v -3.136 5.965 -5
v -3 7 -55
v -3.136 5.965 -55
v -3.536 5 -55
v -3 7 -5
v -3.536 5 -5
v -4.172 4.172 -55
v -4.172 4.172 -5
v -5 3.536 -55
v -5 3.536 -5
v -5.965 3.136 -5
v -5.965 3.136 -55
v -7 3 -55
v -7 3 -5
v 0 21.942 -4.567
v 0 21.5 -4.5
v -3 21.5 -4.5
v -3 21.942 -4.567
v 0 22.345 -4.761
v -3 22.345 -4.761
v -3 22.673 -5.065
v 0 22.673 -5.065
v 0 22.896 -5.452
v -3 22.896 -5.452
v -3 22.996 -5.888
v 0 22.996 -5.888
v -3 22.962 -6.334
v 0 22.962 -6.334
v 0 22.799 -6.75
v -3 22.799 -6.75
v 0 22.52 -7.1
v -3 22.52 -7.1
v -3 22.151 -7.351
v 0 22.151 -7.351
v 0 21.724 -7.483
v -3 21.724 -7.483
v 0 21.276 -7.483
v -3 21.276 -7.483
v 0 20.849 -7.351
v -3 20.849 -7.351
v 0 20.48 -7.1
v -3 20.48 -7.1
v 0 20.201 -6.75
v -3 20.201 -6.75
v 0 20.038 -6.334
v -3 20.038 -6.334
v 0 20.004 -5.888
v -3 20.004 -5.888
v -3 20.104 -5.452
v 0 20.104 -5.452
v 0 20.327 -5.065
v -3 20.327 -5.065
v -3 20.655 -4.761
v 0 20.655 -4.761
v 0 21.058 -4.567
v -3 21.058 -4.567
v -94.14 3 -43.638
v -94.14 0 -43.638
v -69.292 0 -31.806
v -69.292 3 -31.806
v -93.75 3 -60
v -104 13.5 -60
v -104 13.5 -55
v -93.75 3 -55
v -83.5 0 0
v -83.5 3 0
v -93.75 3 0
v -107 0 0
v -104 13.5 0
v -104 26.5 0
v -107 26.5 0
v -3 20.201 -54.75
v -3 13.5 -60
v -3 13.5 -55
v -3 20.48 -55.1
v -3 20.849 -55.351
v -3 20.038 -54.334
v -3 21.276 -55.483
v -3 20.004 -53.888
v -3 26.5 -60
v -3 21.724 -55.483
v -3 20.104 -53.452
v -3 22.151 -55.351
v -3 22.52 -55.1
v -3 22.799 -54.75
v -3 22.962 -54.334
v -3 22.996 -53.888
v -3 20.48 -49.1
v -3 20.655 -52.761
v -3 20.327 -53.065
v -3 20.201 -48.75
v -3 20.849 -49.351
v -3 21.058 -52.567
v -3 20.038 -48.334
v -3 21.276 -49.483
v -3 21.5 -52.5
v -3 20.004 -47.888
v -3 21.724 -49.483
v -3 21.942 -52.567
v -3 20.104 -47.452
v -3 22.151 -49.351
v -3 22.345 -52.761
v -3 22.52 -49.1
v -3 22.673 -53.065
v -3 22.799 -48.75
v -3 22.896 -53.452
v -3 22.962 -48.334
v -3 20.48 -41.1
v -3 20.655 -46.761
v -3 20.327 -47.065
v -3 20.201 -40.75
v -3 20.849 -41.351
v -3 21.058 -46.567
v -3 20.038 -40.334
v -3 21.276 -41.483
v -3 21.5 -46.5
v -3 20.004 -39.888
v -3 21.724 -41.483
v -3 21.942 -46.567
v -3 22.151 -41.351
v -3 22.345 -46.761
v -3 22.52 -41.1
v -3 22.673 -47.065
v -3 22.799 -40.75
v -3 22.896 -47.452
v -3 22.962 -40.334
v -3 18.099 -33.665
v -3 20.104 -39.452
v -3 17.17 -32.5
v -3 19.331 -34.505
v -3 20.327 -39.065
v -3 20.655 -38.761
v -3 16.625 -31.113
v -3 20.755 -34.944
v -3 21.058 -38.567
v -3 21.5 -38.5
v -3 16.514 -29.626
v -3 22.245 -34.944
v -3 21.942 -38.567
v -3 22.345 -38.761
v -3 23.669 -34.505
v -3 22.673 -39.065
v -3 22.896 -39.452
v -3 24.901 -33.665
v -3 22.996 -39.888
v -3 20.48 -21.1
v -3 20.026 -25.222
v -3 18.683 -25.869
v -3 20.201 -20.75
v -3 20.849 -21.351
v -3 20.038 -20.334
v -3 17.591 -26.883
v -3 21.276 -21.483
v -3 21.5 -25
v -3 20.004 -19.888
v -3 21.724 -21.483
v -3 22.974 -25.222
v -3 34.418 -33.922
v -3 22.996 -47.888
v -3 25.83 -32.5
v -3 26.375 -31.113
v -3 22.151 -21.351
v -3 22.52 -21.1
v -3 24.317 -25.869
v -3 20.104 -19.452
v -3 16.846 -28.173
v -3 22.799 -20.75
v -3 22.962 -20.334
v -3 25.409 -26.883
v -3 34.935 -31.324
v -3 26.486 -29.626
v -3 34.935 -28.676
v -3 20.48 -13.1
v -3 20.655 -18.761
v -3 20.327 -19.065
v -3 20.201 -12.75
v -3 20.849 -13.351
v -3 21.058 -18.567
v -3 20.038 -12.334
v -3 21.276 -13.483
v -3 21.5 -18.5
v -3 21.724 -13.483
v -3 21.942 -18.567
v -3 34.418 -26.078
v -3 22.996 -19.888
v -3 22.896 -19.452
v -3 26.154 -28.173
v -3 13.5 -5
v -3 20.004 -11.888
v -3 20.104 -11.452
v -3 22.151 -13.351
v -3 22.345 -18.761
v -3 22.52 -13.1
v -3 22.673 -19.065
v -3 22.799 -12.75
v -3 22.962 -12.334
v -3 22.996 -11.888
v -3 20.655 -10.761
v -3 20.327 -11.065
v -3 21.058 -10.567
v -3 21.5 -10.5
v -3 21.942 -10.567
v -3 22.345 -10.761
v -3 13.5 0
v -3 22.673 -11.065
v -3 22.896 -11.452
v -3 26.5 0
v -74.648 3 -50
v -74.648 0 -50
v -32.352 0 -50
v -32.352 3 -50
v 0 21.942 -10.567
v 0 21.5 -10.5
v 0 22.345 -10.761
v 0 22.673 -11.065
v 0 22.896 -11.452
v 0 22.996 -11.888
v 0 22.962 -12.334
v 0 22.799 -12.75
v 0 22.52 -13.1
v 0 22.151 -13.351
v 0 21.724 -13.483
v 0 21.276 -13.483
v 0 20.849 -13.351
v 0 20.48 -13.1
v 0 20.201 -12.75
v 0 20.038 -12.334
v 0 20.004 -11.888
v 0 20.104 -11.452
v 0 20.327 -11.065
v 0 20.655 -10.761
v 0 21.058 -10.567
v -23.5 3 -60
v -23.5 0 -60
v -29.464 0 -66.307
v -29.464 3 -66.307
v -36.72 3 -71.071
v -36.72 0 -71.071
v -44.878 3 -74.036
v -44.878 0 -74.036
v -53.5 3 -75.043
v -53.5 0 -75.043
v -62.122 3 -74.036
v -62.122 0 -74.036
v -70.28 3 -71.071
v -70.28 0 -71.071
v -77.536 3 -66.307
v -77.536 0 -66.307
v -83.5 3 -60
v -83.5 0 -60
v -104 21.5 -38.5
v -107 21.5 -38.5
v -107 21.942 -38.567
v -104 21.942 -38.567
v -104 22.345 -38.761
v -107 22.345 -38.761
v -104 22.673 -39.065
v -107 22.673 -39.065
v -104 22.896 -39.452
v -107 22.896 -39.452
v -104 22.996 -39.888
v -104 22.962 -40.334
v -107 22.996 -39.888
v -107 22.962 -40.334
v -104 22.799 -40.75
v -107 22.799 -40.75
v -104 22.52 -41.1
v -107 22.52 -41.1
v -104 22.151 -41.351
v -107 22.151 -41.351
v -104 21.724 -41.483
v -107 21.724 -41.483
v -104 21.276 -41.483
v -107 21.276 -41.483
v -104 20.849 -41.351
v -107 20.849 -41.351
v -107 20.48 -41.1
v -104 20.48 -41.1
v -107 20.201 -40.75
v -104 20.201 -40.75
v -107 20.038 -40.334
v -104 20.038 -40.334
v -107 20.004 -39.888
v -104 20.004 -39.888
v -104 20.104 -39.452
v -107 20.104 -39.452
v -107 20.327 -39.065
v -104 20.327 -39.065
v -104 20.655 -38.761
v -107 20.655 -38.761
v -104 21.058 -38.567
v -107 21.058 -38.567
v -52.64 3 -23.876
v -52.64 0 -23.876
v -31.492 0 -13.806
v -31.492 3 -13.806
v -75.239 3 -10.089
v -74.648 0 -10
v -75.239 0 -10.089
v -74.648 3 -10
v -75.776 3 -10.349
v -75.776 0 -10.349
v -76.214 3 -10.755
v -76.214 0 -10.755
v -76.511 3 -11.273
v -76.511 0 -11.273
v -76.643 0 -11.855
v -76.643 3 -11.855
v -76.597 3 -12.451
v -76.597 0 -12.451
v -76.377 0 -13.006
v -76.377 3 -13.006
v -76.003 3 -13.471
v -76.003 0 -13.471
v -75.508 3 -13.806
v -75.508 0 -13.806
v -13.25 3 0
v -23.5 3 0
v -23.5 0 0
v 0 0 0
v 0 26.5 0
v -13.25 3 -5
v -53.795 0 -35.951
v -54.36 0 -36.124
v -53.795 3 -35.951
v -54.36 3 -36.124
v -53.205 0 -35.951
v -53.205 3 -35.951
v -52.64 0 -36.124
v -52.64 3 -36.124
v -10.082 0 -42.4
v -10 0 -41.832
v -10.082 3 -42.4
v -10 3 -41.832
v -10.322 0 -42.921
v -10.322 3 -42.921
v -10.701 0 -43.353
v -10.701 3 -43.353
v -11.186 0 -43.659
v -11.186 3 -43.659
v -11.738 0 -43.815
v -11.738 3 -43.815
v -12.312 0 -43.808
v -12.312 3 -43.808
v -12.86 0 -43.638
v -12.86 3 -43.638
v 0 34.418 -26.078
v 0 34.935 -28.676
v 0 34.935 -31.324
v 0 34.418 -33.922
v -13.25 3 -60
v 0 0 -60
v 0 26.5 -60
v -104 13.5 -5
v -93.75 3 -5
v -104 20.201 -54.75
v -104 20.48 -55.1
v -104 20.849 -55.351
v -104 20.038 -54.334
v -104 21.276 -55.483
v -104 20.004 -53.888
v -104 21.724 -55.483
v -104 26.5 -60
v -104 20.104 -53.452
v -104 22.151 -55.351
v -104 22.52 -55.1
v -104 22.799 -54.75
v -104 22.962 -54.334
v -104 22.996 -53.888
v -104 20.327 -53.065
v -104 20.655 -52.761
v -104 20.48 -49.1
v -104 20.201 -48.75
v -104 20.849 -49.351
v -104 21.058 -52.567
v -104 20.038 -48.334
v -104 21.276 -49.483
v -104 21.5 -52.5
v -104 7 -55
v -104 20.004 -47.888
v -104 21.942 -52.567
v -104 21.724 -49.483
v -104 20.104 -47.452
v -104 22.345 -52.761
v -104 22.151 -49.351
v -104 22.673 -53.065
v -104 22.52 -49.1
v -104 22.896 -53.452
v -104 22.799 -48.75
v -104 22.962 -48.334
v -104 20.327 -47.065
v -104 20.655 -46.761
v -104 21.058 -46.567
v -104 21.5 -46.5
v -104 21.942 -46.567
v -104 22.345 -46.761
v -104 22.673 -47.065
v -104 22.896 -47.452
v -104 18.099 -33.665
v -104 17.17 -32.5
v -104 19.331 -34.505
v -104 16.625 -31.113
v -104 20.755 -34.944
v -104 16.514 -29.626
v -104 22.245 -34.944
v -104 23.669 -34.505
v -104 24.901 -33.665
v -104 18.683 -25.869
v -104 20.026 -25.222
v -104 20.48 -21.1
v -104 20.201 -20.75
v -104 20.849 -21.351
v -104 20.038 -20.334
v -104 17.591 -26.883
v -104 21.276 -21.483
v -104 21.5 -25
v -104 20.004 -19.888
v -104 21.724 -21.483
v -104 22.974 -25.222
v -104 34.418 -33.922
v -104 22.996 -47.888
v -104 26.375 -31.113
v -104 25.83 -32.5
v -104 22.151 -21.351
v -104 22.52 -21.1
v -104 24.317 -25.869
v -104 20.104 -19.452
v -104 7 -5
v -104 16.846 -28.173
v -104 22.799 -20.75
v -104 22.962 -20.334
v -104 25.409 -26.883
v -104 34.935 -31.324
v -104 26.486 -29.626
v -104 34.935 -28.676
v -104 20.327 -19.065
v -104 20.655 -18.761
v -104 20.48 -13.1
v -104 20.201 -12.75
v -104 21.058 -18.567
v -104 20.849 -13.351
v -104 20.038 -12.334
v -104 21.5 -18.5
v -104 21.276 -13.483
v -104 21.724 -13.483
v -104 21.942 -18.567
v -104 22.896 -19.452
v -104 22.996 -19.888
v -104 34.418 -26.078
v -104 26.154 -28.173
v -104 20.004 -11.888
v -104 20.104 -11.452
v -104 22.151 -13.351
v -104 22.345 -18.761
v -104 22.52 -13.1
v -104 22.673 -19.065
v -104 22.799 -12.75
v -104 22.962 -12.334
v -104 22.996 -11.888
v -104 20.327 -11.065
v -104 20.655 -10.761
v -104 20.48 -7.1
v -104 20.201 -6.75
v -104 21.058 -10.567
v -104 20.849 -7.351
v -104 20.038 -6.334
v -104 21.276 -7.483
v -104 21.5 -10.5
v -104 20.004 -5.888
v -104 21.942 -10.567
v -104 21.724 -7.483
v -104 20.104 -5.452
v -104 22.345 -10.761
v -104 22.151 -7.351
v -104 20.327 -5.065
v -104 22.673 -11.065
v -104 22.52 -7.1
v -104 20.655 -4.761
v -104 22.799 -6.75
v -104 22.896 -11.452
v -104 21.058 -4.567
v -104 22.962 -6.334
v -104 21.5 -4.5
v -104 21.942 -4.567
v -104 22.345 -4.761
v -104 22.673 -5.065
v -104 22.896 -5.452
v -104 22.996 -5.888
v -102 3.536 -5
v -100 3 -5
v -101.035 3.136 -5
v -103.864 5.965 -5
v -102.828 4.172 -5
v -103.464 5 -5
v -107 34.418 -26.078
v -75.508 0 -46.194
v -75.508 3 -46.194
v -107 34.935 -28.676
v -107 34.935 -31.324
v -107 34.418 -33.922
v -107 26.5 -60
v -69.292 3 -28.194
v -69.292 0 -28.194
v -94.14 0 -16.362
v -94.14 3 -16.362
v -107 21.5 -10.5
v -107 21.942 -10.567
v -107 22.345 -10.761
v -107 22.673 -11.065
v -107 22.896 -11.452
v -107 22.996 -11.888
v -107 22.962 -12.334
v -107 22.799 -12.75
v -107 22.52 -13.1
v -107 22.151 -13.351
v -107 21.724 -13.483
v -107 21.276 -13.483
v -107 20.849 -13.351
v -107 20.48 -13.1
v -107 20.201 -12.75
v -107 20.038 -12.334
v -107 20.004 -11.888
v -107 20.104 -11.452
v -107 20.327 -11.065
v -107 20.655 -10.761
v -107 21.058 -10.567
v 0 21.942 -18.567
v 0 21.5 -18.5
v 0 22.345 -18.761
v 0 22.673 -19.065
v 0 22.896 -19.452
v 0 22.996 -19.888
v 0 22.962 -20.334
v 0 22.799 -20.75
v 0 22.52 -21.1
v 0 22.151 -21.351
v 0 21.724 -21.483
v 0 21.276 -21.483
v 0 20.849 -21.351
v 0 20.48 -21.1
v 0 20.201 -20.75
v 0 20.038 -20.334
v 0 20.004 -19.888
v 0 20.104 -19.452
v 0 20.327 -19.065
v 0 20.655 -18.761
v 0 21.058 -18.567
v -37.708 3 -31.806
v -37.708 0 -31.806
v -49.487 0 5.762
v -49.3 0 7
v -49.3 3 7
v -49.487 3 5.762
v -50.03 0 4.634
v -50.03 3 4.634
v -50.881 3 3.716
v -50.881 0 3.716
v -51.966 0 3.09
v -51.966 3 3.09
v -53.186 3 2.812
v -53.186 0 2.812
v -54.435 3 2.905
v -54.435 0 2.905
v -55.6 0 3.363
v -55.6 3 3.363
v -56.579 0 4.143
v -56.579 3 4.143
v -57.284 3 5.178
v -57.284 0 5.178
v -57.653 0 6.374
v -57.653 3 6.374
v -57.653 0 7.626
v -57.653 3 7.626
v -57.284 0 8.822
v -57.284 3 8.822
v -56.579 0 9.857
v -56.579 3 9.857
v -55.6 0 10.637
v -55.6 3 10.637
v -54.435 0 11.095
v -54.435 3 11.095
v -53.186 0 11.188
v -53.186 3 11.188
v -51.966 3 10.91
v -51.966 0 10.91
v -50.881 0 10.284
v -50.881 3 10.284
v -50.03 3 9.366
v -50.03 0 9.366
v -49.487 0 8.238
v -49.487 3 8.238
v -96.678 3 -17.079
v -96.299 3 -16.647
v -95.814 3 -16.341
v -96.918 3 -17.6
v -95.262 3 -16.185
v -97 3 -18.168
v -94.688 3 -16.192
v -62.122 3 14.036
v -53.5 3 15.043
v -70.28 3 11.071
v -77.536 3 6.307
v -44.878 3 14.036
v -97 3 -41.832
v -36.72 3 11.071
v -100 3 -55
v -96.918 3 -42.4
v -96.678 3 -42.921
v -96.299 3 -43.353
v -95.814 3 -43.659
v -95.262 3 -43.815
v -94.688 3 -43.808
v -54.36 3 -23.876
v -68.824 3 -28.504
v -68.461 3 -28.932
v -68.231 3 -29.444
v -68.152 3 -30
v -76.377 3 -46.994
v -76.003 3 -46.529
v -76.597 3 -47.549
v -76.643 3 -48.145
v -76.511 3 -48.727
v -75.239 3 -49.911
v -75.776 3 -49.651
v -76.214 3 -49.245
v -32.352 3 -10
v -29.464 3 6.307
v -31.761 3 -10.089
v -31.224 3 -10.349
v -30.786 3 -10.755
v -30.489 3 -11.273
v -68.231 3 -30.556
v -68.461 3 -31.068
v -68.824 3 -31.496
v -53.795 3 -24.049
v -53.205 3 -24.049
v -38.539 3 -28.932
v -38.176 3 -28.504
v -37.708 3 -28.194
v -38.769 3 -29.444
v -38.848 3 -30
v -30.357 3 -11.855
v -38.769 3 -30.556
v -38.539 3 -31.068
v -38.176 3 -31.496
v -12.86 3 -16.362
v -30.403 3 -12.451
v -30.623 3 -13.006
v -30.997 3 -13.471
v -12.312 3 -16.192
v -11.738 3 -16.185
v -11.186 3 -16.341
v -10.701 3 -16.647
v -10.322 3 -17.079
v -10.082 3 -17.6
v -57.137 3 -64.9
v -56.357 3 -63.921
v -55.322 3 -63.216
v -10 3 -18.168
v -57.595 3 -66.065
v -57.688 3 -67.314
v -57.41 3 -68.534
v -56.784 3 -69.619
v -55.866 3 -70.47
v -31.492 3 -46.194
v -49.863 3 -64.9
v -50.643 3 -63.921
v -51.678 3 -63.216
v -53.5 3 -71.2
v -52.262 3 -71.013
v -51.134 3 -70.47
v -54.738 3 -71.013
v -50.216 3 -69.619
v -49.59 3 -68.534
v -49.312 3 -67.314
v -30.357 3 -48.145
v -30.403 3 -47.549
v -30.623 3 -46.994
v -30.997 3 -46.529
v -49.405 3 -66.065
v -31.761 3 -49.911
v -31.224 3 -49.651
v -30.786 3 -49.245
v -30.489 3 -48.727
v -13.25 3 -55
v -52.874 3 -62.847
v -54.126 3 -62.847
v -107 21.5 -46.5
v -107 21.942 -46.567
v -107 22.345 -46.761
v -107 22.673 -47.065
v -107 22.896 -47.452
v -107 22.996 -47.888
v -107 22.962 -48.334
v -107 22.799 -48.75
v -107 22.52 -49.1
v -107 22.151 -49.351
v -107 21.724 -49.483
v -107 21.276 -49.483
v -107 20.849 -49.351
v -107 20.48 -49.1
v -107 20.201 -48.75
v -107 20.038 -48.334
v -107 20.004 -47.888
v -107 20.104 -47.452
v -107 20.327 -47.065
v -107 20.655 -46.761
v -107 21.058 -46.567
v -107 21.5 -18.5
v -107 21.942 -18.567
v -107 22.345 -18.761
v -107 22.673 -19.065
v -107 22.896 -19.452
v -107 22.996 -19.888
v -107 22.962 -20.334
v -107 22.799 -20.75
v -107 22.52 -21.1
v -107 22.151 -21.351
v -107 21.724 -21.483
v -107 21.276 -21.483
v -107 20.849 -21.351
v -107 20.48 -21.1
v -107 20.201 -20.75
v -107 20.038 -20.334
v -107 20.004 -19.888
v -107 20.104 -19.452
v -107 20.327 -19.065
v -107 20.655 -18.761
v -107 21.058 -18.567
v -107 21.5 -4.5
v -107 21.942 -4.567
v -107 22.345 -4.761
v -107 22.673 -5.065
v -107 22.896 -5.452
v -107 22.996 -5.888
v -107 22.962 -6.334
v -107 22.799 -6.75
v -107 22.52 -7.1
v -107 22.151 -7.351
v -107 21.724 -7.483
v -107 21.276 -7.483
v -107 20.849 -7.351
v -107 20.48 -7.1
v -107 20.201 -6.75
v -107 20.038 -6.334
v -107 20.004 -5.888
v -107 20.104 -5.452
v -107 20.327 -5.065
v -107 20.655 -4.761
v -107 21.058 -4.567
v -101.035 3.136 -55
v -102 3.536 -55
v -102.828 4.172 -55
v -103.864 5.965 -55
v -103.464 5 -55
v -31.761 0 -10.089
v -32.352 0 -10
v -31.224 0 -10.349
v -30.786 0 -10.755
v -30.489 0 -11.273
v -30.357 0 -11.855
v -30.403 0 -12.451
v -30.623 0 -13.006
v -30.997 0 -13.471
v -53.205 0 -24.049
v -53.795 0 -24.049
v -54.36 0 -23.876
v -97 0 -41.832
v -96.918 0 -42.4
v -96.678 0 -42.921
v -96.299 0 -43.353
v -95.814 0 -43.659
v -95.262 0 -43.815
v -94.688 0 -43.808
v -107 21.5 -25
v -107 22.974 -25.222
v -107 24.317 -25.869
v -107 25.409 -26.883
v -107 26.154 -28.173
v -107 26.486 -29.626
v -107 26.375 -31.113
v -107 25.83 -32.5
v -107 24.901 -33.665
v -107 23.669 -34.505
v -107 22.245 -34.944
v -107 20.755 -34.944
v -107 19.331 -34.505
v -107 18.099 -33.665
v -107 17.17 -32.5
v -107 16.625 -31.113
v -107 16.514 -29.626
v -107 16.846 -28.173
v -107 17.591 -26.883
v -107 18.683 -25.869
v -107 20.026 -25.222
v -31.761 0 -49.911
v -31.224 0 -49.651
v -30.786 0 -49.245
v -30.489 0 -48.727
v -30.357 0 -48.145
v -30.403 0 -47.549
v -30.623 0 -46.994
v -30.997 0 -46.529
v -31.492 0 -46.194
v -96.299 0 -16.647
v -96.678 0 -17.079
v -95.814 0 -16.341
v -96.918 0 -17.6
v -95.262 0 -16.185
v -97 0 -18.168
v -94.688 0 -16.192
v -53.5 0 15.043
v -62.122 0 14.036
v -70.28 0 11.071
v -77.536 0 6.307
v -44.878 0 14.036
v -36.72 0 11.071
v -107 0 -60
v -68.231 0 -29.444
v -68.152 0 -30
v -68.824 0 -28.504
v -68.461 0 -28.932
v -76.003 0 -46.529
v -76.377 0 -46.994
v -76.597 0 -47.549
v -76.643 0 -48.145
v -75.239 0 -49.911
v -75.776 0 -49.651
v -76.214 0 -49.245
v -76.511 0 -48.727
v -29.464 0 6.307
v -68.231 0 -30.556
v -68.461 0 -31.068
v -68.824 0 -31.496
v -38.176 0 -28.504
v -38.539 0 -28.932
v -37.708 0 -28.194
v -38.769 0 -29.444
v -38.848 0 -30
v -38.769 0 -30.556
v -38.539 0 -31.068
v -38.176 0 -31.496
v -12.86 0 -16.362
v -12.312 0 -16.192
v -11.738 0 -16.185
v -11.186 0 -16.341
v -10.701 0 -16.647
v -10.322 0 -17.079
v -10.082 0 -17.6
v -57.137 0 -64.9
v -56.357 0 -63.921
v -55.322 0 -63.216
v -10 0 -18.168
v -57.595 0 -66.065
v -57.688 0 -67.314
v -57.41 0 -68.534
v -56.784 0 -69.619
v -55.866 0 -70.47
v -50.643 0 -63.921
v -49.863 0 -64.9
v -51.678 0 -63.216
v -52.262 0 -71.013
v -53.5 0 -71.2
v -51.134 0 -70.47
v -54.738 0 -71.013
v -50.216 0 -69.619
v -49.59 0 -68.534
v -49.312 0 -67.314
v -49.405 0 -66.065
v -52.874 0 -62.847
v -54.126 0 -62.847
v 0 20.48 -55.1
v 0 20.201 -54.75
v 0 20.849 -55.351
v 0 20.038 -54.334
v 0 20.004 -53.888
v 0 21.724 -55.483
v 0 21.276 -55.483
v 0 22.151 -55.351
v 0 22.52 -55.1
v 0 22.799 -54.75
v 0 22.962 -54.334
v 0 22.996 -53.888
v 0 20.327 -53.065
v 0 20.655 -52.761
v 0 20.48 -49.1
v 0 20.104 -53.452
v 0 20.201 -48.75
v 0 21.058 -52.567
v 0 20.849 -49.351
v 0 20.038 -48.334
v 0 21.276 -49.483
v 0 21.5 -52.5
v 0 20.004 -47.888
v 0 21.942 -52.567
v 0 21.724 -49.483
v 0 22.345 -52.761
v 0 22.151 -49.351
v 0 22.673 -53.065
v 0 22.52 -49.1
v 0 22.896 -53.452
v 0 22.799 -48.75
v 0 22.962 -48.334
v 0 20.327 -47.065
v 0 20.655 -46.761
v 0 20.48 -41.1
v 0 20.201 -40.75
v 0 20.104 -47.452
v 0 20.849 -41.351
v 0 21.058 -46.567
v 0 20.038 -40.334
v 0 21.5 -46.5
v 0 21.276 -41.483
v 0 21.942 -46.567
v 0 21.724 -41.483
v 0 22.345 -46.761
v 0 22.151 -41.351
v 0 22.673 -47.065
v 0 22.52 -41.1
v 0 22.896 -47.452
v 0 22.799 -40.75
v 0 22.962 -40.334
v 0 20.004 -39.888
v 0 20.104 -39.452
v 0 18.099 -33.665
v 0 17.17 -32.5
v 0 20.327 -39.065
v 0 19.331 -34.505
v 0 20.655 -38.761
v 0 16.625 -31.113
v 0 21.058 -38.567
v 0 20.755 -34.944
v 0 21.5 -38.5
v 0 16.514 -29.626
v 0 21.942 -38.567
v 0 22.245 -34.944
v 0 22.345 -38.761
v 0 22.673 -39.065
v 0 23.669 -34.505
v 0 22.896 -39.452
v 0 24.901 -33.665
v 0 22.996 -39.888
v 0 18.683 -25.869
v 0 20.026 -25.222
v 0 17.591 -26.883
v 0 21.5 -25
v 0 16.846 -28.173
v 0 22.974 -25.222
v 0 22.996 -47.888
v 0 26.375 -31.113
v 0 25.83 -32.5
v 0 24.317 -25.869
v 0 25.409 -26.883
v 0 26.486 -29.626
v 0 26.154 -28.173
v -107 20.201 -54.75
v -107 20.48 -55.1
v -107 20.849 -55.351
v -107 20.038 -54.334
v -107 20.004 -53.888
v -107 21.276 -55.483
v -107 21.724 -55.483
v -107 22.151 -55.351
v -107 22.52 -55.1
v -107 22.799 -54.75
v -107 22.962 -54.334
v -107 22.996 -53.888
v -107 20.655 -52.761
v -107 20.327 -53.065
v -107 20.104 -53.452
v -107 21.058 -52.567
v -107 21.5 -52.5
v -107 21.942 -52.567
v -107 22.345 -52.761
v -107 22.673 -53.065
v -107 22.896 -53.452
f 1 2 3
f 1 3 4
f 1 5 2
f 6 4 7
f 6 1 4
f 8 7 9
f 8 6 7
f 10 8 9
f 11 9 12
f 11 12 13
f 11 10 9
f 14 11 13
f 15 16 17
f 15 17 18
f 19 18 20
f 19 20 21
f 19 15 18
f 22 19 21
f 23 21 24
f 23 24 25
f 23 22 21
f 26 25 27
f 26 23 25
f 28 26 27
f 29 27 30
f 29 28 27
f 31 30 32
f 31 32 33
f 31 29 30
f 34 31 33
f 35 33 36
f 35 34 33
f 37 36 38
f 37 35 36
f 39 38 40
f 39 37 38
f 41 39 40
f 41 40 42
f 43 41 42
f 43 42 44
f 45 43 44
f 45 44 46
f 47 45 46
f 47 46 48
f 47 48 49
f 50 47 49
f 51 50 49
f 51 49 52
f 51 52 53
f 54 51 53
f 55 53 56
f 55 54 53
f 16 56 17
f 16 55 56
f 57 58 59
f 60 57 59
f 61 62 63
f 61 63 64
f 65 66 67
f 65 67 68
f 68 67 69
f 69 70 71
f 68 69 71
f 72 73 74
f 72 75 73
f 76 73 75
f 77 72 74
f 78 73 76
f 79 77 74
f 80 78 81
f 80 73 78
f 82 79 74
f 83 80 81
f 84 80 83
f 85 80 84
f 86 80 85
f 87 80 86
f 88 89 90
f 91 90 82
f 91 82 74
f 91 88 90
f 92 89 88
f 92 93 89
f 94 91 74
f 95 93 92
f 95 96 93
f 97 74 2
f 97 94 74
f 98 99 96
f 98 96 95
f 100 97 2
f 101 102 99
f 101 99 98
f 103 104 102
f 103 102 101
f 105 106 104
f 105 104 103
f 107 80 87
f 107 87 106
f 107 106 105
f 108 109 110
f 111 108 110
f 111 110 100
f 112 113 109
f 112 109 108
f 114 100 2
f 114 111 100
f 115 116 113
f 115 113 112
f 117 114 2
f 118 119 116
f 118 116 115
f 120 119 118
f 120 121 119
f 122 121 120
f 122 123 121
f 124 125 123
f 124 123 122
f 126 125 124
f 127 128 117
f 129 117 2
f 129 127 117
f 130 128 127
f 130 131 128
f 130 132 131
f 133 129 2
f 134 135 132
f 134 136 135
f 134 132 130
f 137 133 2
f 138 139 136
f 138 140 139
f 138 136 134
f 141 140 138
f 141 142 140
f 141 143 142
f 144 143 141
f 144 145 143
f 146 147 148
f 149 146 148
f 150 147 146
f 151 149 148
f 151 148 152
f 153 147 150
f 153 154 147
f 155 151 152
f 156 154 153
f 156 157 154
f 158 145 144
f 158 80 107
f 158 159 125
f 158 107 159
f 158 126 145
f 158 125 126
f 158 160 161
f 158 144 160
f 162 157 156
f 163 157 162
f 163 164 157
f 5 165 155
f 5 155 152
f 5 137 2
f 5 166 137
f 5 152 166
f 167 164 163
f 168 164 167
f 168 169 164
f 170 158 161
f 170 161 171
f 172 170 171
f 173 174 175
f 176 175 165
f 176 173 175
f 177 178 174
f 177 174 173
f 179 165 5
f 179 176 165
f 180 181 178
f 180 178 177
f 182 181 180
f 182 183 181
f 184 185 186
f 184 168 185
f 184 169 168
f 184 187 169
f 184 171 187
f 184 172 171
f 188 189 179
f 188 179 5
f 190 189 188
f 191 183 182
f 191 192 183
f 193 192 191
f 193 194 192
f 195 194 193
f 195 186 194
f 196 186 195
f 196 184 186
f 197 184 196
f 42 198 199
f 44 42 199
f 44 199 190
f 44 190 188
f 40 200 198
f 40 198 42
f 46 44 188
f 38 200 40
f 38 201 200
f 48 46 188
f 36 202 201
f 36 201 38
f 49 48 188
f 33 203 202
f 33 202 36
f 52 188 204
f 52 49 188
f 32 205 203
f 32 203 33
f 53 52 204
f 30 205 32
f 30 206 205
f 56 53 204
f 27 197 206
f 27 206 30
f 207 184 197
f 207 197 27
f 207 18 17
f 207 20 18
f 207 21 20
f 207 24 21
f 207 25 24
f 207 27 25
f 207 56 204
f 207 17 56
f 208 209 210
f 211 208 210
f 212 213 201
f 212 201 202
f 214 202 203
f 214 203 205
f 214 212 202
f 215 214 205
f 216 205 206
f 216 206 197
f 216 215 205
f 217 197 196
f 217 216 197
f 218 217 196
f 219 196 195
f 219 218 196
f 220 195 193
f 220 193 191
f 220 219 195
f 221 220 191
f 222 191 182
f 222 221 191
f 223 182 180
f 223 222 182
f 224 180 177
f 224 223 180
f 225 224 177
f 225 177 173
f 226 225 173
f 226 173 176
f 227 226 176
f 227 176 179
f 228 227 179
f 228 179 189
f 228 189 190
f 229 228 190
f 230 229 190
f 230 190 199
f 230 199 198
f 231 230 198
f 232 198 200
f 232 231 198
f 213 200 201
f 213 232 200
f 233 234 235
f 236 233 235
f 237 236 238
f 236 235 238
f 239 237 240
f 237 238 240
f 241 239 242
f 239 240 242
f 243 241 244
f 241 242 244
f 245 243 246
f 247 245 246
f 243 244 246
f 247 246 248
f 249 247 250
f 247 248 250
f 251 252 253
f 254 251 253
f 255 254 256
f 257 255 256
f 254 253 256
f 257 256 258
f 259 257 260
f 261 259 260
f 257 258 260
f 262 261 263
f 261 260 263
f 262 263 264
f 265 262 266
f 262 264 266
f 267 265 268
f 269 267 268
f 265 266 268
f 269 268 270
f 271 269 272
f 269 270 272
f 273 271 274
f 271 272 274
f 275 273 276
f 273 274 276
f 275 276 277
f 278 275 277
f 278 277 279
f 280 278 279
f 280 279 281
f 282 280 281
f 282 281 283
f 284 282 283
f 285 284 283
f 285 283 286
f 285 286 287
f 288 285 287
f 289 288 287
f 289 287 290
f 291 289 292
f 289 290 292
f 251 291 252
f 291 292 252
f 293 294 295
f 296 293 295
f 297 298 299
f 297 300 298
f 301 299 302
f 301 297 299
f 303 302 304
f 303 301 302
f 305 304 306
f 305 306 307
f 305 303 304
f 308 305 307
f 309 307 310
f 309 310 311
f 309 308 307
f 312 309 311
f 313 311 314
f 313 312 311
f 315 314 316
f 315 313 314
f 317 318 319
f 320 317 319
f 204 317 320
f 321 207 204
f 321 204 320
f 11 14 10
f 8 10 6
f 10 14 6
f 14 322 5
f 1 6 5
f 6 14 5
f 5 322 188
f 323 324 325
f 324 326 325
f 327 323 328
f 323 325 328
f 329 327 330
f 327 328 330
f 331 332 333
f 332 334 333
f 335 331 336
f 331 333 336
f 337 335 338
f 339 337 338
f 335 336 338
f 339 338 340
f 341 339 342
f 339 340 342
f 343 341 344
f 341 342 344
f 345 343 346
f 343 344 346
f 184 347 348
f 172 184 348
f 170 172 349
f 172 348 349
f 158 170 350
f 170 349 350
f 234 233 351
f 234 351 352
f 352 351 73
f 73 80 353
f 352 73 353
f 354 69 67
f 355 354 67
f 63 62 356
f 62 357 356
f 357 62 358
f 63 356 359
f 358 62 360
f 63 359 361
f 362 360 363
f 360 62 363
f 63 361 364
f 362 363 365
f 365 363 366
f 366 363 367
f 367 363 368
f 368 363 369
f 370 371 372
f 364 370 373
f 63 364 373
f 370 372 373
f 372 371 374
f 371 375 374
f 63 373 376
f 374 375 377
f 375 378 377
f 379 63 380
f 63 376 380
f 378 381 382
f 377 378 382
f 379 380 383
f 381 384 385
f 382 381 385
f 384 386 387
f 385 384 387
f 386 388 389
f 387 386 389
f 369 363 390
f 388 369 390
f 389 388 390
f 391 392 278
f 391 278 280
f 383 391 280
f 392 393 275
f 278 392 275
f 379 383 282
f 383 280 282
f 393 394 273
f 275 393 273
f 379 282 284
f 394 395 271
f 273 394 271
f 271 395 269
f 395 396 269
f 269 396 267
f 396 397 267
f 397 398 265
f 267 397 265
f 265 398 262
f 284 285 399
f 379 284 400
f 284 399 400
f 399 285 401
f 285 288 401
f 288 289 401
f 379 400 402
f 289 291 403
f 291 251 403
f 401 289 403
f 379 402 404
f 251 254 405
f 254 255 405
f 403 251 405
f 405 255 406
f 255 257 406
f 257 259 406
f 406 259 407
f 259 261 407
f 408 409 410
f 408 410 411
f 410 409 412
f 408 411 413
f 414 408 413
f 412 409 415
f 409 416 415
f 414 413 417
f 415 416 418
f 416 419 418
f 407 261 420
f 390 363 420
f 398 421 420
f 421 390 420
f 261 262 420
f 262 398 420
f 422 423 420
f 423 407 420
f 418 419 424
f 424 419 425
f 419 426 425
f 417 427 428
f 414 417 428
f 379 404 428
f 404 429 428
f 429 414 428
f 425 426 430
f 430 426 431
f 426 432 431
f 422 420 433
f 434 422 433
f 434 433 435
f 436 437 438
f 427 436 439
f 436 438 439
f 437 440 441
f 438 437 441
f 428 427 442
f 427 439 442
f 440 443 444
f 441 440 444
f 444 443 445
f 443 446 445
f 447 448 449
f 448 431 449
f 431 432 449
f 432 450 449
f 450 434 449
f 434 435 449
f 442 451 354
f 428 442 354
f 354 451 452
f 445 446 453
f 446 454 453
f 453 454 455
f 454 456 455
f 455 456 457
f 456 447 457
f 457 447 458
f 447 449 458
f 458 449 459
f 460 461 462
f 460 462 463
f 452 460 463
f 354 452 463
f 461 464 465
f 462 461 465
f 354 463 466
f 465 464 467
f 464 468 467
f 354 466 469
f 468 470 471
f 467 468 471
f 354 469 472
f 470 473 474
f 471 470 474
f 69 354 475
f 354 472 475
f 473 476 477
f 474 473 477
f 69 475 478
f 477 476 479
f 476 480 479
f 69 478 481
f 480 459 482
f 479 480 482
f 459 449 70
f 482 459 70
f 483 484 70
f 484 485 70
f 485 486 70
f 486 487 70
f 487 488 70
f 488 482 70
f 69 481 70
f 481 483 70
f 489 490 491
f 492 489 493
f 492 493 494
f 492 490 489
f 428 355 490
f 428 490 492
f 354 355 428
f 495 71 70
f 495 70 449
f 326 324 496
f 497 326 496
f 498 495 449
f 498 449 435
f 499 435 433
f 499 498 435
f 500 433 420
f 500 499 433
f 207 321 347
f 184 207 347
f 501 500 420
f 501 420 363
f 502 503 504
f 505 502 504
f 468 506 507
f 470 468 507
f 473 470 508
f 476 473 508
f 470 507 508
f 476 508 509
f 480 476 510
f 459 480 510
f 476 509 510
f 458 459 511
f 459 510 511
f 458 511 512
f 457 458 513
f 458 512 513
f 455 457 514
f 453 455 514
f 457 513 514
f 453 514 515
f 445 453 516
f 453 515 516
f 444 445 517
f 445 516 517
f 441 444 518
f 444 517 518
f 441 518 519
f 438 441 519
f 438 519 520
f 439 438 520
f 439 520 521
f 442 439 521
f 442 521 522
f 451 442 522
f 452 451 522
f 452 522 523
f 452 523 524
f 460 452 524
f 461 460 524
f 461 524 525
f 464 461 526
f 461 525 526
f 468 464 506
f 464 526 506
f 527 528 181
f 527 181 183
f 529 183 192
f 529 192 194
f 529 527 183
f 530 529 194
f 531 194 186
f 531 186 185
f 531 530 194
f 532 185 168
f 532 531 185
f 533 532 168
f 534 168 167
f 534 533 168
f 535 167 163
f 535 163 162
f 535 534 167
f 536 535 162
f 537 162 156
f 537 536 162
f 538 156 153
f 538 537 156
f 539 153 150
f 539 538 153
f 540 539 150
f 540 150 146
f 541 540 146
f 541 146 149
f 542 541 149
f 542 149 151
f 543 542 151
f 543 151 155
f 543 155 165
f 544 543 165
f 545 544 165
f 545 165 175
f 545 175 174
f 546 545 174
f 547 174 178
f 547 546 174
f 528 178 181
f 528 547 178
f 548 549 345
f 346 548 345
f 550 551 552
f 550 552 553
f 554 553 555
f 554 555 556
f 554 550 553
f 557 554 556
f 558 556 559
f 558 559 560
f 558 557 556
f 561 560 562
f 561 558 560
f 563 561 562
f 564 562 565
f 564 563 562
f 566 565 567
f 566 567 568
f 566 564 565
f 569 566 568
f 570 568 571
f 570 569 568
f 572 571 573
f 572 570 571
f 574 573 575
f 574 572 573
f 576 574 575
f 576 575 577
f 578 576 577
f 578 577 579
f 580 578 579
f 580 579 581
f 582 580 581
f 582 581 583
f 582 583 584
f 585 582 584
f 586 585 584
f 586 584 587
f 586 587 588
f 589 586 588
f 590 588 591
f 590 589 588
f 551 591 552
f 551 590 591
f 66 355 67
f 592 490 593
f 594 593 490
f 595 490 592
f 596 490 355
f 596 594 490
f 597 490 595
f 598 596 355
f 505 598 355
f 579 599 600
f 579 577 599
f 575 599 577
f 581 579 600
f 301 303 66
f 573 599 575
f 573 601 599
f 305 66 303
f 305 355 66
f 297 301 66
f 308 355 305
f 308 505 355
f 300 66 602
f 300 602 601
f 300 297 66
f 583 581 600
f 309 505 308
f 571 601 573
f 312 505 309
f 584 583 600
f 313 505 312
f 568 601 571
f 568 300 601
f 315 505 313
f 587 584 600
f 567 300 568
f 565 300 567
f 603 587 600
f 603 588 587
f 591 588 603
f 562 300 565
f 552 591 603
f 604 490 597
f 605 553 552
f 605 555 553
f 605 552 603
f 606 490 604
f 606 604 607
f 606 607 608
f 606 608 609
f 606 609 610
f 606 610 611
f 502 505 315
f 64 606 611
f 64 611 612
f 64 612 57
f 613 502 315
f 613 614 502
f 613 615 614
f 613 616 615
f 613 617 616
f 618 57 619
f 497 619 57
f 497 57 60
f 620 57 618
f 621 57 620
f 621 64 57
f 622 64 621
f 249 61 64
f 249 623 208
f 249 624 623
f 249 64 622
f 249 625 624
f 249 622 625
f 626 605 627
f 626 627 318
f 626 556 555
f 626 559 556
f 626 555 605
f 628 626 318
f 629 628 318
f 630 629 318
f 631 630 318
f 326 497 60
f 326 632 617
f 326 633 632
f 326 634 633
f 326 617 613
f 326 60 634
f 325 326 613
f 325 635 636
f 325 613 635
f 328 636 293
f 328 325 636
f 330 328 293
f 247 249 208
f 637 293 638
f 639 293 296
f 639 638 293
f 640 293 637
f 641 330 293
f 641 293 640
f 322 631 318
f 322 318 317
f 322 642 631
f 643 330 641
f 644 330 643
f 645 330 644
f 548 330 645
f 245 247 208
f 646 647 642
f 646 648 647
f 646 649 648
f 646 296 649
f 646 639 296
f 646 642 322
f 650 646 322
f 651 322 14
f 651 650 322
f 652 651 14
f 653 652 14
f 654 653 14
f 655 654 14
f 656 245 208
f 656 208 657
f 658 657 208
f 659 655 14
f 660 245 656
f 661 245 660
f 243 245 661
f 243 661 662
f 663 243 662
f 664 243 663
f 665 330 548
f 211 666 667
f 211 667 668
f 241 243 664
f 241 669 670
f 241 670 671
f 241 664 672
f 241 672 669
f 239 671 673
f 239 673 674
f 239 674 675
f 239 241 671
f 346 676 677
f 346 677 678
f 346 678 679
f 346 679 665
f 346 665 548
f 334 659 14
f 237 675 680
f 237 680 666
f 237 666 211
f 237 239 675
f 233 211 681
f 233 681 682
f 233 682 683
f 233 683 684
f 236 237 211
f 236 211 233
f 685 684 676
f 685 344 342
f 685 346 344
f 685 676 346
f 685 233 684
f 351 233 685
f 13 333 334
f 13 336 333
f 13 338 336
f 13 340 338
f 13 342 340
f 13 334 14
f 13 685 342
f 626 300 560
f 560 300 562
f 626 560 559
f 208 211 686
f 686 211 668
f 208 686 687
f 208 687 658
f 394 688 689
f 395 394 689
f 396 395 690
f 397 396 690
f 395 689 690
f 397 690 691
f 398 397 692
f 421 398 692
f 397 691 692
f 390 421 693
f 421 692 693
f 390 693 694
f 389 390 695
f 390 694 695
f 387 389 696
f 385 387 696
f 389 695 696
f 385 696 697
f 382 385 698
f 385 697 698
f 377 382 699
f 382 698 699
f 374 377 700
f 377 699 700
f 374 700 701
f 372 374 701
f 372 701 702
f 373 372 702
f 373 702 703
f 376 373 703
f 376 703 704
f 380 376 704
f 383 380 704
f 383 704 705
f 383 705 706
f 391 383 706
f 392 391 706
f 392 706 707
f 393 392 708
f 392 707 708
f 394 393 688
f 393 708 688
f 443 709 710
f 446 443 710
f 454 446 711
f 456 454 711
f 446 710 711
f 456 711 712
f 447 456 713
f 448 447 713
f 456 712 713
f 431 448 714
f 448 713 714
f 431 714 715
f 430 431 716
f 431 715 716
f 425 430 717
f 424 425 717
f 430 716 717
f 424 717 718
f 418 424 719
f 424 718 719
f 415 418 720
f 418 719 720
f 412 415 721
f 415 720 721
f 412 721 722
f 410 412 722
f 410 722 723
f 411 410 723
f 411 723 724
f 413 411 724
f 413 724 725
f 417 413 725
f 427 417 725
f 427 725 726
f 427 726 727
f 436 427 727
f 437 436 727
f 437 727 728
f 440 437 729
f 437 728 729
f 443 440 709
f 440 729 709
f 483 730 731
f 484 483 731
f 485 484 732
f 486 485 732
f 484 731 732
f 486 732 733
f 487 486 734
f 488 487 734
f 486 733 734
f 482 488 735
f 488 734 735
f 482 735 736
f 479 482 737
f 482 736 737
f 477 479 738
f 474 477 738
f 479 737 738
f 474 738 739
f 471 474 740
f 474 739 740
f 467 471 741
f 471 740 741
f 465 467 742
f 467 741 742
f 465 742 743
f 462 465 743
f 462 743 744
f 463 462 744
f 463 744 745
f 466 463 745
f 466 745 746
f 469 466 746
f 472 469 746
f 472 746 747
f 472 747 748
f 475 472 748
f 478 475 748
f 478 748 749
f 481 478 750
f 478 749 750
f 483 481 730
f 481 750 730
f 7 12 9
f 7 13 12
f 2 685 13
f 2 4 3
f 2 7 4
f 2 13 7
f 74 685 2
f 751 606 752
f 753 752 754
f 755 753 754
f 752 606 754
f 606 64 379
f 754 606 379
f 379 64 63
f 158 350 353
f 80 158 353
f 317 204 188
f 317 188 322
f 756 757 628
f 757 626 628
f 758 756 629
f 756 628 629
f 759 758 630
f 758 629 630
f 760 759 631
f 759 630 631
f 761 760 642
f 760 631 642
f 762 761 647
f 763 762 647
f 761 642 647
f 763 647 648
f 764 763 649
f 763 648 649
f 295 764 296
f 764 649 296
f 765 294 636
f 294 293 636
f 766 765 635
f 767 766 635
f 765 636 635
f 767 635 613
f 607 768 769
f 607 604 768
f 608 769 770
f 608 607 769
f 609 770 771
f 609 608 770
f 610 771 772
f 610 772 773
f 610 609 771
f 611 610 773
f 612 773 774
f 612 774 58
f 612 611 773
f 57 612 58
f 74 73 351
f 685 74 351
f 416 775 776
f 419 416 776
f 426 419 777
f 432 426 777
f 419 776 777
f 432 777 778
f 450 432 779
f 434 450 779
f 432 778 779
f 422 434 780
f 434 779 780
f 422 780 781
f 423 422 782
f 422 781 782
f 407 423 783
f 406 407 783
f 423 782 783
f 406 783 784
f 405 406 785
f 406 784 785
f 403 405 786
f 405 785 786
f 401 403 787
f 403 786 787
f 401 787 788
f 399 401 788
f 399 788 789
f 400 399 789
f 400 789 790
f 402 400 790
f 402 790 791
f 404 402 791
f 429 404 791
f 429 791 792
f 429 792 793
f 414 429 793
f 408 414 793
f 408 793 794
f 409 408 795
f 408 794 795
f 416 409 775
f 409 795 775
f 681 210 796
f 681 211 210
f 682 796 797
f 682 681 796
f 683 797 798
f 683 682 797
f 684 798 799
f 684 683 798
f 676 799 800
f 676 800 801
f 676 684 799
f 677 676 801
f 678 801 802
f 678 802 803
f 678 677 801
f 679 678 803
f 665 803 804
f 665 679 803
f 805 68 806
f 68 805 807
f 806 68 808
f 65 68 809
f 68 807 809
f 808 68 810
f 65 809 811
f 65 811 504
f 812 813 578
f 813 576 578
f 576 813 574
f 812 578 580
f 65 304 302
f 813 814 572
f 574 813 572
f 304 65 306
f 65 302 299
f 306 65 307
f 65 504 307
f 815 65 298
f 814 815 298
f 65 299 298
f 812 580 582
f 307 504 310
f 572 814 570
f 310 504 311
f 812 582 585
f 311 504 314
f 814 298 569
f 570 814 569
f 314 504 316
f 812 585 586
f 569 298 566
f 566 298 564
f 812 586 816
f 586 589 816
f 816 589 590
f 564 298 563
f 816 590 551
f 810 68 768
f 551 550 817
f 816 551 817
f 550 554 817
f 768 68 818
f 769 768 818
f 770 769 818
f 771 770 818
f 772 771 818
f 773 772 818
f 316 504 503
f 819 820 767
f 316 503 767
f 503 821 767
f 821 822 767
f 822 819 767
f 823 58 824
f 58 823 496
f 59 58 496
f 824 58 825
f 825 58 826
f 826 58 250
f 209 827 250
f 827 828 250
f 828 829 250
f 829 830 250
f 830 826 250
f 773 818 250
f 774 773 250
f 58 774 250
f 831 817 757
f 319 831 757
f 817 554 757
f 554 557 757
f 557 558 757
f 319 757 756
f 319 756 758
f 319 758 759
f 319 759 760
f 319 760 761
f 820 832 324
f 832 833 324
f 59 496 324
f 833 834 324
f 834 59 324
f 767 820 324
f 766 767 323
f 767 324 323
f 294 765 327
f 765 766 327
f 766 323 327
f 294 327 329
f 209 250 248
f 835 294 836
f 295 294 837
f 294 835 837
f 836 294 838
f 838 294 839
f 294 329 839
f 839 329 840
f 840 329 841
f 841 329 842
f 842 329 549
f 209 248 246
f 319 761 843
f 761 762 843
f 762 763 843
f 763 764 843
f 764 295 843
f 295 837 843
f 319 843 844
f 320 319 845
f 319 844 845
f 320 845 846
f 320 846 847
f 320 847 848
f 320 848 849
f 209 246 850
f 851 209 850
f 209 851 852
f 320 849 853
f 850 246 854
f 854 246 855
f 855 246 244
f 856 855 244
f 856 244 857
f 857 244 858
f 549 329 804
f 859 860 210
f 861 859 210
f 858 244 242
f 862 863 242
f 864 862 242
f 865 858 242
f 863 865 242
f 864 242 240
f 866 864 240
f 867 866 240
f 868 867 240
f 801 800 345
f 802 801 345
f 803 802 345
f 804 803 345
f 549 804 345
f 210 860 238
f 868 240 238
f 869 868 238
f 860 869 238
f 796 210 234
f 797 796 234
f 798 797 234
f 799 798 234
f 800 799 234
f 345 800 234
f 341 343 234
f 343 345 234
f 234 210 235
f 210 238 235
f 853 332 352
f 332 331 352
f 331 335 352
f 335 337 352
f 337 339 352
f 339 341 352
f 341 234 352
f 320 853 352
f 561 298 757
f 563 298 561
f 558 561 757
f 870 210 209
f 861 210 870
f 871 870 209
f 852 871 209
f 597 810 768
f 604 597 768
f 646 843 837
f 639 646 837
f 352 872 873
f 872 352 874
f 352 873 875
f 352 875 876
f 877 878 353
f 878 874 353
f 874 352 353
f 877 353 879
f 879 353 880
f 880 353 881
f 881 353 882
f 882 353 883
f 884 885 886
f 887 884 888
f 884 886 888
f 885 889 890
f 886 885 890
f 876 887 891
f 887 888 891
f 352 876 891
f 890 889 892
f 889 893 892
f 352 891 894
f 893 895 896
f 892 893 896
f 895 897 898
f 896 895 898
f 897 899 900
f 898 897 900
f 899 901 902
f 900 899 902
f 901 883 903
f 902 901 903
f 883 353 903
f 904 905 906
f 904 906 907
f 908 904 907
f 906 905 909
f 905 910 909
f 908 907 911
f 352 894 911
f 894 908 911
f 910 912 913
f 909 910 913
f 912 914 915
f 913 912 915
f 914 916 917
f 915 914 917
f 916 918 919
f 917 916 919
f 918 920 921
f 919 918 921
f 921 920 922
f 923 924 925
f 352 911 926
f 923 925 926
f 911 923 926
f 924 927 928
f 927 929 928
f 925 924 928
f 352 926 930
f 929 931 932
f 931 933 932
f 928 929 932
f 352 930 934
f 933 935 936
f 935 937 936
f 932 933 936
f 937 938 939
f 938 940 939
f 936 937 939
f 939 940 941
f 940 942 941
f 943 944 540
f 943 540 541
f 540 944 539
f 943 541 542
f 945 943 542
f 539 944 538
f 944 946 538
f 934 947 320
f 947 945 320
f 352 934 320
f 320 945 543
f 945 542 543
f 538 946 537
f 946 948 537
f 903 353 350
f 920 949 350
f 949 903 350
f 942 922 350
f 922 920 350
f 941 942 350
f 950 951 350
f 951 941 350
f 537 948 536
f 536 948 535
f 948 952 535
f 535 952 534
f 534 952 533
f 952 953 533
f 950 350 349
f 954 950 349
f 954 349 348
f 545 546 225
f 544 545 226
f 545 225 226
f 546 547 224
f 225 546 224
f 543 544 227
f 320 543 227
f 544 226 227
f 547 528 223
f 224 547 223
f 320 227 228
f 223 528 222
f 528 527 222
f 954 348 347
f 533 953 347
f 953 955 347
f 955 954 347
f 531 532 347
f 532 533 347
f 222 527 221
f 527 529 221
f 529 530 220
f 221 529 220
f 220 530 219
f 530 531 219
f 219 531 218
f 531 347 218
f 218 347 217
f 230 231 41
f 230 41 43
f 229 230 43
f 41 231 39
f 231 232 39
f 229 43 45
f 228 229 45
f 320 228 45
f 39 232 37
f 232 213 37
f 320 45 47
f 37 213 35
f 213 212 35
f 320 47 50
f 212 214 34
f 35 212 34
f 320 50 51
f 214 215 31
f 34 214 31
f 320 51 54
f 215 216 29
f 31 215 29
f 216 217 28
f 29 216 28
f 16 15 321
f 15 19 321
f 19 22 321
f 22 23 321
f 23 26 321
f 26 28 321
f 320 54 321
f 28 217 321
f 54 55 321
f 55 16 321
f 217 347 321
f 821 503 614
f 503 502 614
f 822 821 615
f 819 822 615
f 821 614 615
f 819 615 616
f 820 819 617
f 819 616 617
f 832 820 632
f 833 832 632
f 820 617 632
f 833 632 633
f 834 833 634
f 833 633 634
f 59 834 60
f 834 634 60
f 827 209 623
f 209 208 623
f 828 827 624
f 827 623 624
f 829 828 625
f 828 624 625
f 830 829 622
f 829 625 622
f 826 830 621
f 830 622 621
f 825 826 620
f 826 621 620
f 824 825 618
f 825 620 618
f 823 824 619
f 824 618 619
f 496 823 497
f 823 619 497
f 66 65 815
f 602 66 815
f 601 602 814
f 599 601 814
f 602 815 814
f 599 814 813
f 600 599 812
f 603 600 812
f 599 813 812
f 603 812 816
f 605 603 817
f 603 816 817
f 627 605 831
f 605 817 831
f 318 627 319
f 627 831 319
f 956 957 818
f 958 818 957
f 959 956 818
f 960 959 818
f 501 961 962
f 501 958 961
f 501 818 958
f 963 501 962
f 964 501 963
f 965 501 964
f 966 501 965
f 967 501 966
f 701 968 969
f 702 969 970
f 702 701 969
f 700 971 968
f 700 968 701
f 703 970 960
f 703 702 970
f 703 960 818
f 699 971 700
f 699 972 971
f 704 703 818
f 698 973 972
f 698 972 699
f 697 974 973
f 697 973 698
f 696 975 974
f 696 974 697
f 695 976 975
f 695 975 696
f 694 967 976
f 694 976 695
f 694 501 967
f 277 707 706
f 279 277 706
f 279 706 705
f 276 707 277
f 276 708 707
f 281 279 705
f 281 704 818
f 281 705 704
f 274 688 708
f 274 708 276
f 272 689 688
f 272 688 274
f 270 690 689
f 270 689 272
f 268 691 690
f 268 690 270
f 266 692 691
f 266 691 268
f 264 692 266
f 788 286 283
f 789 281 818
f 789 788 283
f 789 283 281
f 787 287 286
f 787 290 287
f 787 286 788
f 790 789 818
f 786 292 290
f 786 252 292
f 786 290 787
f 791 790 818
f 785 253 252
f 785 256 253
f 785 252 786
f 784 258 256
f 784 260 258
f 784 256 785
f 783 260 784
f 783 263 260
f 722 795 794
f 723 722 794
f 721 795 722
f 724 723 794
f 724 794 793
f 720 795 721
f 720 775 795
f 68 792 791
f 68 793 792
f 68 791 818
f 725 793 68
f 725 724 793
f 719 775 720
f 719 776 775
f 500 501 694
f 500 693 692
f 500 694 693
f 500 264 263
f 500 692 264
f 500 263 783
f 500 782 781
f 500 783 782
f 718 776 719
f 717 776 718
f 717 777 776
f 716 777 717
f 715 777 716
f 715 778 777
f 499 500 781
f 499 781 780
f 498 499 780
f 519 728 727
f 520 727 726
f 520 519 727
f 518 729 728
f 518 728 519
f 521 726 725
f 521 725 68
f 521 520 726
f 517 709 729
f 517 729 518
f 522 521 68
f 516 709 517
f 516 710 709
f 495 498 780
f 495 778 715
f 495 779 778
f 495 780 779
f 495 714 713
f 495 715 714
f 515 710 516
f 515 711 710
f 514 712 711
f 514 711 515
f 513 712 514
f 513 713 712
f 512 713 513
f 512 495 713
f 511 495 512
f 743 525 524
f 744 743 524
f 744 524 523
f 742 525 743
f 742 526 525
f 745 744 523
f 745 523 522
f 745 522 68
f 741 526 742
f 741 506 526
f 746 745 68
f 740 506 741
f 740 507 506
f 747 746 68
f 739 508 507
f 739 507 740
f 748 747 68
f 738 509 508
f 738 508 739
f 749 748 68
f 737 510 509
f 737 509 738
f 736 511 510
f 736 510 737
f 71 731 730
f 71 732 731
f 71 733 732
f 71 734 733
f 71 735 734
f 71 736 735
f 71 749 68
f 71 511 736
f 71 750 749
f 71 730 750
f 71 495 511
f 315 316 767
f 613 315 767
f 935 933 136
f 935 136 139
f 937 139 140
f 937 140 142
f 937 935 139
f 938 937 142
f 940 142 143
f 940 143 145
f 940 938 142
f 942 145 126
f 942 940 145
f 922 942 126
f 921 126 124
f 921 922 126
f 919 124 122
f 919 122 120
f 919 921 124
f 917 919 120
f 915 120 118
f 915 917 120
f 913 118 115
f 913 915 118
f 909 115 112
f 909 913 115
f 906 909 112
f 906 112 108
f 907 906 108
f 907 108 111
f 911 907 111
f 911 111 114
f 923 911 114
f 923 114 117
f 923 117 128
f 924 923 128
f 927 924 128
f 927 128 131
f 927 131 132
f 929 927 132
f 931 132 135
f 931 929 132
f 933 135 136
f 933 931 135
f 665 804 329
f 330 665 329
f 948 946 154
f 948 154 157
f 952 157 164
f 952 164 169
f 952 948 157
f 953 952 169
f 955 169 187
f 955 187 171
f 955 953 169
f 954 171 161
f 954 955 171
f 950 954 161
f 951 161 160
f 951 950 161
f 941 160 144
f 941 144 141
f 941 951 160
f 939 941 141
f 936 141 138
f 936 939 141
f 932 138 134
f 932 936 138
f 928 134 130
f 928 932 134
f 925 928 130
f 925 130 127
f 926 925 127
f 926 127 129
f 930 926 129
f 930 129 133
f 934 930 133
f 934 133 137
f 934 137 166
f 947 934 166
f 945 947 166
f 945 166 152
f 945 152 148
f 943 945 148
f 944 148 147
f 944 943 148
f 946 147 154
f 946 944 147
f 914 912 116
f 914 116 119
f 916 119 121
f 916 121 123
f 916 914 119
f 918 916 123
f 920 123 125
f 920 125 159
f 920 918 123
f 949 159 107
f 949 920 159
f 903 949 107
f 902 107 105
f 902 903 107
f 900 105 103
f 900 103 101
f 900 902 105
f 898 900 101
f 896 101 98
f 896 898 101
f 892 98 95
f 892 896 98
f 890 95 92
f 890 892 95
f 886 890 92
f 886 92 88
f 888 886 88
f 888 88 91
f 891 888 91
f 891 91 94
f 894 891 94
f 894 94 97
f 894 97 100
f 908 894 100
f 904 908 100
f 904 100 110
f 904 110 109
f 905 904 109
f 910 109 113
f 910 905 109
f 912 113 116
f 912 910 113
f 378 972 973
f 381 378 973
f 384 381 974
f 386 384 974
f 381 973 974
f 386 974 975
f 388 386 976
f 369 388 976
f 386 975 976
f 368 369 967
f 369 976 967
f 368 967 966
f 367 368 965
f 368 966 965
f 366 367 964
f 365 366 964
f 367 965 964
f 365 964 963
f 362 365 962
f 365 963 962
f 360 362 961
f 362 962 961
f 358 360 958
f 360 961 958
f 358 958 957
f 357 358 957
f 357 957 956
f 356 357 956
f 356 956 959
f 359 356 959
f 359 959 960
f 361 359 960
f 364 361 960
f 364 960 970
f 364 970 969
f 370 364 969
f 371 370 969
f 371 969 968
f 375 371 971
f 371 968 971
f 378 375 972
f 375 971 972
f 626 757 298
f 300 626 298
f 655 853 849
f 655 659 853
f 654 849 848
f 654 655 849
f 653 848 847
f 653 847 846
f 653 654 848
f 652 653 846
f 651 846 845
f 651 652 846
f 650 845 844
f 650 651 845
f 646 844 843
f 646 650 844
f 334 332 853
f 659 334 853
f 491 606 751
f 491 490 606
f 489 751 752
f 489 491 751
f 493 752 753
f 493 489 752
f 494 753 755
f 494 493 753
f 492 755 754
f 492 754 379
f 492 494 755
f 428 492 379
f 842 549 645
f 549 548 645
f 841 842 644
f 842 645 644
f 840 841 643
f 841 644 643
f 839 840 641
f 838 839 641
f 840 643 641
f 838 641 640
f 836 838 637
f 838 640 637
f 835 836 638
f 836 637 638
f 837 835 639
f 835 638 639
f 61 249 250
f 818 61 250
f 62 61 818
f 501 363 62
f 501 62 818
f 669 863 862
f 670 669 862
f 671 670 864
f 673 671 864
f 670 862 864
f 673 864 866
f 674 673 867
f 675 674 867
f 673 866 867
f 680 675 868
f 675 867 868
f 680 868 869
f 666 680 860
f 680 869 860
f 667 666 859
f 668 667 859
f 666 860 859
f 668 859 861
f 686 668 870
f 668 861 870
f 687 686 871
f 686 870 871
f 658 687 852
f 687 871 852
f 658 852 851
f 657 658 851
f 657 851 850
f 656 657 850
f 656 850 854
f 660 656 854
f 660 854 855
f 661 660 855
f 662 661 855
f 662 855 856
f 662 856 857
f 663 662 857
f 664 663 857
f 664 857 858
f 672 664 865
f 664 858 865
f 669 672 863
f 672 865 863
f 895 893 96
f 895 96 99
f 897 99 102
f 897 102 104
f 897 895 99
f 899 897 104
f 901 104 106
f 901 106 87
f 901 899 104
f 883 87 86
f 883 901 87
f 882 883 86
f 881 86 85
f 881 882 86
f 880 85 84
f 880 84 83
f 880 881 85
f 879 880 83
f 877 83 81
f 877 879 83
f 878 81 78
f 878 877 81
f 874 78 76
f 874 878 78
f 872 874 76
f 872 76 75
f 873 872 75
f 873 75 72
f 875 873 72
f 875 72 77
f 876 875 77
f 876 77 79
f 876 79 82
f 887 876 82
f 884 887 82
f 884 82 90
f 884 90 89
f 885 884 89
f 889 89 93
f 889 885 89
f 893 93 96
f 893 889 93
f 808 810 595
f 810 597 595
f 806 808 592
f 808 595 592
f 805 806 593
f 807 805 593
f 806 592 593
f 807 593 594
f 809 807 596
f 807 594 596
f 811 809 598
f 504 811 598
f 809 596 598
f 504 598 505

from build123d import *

# Parameters (mm, degrees)
SKETCH1_R            = 4.2
BOSS_EXTRUDE1_DEPTH  = 3
FILLET1_R            = 2
SKETCH2_R            = 1.5
SKETCH2_R_2          = 5
BOSS_EXTRUDE2_DEPTH  = 3
BOSS_EXTRUDE3_DEPTH  = 5
MIRROR3_COPY_1_DEPTH = 5
FILLET2_R            = 4


with BuildPart() as part:
    # Sketch1 → Boss-Extrude1 (new body)
    with BuildSketch(Plane(origin=(0, 0, 0), x_dir=(1, 0, 0), z_dir=(0, 1, 0))):
        with BuildLine():
            Line((-107, 60), (-107, 0))
            Line((-107, 0), (-83.5, 0))
            ThreePointArc((-83.5, 0), (-53.5, -15.042526813), (-23.5, 0))
            Line((-23.5, 0), (0, 0))
            Line((0, 0), (0, 60))
            Line((0, 60), (-23.5, 60))
            ThreePointArc((-23.5, 60), (-53.5, 75.042526813), (-83.5, 60))
            Line((-83.5, 60), (-107, 60))
        make_face()
        Polygon((-97, 45), (-65.5, 30), (-97, 15), align=None, mode=Mode.SUBTRACT)
        Polygon((-83.5, 10), (-53.5, 24.285714286), (-23.5, 10), align=None, mode=Mode.SUBTRACT)
        Polygon((-10, 15), (-41.5, 30), (-10, 45), align=None, mode=Mode.SUBTRACT)
        Polygon((-23.5, 50), (-53.5, 35.714285714), (-83.5, 50), align=None, mode=Mode.SUBTRACT)
        with BuildLine():
            ThreePointArc((-53.5, 62.8), (-57.7, 67), (-53.5, 71.2))
            ThreePointArc((-53.5, 71.2), (-49.3, 67), (-53.5, 62.8))
        make_face(mode=Mode.SUBTRACT)
        with Locations((-53.5, -7)):
            Circle(SKETCH1_R, mode=Mode.SUBTRACT)
    extrude(amount=BOSS_EXTRUDE1_DEPTH)

    # Fillet1
    fillet1_edges = [part.edges().sort_by_distance(p)[0] for p in [
        (-10, 1.5, -15),
        (-10, 1.5, -45),
        (-41.5, 1.5, -30),
        (-83.5, 1.5, -10),
        (-23.5, 1.5, -10),
        (-53.5, 1.5, -24.285714286),
        (-97, 1.5, -45),
        (-97, 1.5, -15),
        (-65.5, 1.5, -30),
        (-23.5, 1.5, -50),
        (-83.5, 1.5, -50),
        (-53.5, 1.5, -35.714285714),
    ]]
    fillet(fillet1_edges, radius=FILLET1_R)

    # Sketch2 → Boss-Extrude2 (add)
    with BuildSketch(Plane.ZY.offset(107)):
        with BuildLine():
            Line((0, 26.5), (-26.077953741, 34.417722444))
            ThreePointArc((-26.077953741, 34.417722444), (-30, 35), (-33.922046259, 34.417722444))
            Line((-33.922046259, 34.417722444), (-60, 26.5))
            Line((-60, 26.5), (-60, 3))
            Line((-60, 3), (0, 3))
            Line((0, 3), (0, 26.5))
        make_face()
        with Locations((-40, 21.5)):
            Circle(SKETCH2_R, mode=Mode.SUBTRACT)
        with Locations((-30, 21.5)):
            Circle(SKETCH2_R_2, mode=Mode.SUBTRACT)
        with Locations((-12, 21.5)):
            Circle(SKETCH2_R, mode=Mode.SUBTRACT)
        with Locations((-6, 21.5)):
            Circle(SKETCH2_R, mode=Mode.SUBTRACT)
        with Locations((-54, 21.5)):
            Circle(SKETCH2_R, mode=Mode.SUBTRACT)
        with Locations((-48, 21.5)):
            Circle(SKETCH2_R, mode=Mode.SUBTRACT)
        with Locations((-20, 21.5)):
            Circle(SKETCH2_R, mode=Mode.SUBTRACT)
    boss_extrude2 = extrude(amount=-BOSS_EXTRUDE2_DEPTH)

    # Mirror1: Boss-Extrude2 across plane
    add(boss_extrude2.mirror(Plane(origin=(-53.5, 0, 0), x_dir=(0, 0, 1), z_dir=(1, 0, 0))))

    # Sketch4 → Boss-Extrude3 (add)
    with BuildSketch(Plane.XY):
        Polygon((-104, 13.5), (-93.75, 3), (-104, 3), align=None)
    boss_extrude3 = extrude(amount=-BOSS_EXTRUDE3_DEPTH)

    # Mirror2: Boss-Extrude3 across plane
    add(boss_extrude3.mirror(Plane(origin=(-53.5, 0, 0), x_dir=(0, 0, 1), z_dir=(1, 0, 0))))

    # Mirror3: Boss-Extrude3 across plane
    add(boss_extrude3.mirror(Plane.XY.offset(-30)))

    # Mirror3 copy 1 sketch → Mirror3 copy 1 (add)
    with BuildSketch(Plane(origin=(-107, 0, -60), x_dir=(-1, 0, 0), z_dir=(0, 0, -1))):
        Polygon((-104, 13.5), (-93.75, 3), (-104, 3), align=None)
    extrude(amount=-MIRROR3_COPY_1_DEPTH)

    # Fillet2
    fillet2_edges = [part.edges().sort_by_distance(p)[0] for p in [
        (-104, 3, -30),
        (-3, 3, -30),
    ]]
    fillet(fillet2_edges, radius=FILLET2_R)


solid = part.part
